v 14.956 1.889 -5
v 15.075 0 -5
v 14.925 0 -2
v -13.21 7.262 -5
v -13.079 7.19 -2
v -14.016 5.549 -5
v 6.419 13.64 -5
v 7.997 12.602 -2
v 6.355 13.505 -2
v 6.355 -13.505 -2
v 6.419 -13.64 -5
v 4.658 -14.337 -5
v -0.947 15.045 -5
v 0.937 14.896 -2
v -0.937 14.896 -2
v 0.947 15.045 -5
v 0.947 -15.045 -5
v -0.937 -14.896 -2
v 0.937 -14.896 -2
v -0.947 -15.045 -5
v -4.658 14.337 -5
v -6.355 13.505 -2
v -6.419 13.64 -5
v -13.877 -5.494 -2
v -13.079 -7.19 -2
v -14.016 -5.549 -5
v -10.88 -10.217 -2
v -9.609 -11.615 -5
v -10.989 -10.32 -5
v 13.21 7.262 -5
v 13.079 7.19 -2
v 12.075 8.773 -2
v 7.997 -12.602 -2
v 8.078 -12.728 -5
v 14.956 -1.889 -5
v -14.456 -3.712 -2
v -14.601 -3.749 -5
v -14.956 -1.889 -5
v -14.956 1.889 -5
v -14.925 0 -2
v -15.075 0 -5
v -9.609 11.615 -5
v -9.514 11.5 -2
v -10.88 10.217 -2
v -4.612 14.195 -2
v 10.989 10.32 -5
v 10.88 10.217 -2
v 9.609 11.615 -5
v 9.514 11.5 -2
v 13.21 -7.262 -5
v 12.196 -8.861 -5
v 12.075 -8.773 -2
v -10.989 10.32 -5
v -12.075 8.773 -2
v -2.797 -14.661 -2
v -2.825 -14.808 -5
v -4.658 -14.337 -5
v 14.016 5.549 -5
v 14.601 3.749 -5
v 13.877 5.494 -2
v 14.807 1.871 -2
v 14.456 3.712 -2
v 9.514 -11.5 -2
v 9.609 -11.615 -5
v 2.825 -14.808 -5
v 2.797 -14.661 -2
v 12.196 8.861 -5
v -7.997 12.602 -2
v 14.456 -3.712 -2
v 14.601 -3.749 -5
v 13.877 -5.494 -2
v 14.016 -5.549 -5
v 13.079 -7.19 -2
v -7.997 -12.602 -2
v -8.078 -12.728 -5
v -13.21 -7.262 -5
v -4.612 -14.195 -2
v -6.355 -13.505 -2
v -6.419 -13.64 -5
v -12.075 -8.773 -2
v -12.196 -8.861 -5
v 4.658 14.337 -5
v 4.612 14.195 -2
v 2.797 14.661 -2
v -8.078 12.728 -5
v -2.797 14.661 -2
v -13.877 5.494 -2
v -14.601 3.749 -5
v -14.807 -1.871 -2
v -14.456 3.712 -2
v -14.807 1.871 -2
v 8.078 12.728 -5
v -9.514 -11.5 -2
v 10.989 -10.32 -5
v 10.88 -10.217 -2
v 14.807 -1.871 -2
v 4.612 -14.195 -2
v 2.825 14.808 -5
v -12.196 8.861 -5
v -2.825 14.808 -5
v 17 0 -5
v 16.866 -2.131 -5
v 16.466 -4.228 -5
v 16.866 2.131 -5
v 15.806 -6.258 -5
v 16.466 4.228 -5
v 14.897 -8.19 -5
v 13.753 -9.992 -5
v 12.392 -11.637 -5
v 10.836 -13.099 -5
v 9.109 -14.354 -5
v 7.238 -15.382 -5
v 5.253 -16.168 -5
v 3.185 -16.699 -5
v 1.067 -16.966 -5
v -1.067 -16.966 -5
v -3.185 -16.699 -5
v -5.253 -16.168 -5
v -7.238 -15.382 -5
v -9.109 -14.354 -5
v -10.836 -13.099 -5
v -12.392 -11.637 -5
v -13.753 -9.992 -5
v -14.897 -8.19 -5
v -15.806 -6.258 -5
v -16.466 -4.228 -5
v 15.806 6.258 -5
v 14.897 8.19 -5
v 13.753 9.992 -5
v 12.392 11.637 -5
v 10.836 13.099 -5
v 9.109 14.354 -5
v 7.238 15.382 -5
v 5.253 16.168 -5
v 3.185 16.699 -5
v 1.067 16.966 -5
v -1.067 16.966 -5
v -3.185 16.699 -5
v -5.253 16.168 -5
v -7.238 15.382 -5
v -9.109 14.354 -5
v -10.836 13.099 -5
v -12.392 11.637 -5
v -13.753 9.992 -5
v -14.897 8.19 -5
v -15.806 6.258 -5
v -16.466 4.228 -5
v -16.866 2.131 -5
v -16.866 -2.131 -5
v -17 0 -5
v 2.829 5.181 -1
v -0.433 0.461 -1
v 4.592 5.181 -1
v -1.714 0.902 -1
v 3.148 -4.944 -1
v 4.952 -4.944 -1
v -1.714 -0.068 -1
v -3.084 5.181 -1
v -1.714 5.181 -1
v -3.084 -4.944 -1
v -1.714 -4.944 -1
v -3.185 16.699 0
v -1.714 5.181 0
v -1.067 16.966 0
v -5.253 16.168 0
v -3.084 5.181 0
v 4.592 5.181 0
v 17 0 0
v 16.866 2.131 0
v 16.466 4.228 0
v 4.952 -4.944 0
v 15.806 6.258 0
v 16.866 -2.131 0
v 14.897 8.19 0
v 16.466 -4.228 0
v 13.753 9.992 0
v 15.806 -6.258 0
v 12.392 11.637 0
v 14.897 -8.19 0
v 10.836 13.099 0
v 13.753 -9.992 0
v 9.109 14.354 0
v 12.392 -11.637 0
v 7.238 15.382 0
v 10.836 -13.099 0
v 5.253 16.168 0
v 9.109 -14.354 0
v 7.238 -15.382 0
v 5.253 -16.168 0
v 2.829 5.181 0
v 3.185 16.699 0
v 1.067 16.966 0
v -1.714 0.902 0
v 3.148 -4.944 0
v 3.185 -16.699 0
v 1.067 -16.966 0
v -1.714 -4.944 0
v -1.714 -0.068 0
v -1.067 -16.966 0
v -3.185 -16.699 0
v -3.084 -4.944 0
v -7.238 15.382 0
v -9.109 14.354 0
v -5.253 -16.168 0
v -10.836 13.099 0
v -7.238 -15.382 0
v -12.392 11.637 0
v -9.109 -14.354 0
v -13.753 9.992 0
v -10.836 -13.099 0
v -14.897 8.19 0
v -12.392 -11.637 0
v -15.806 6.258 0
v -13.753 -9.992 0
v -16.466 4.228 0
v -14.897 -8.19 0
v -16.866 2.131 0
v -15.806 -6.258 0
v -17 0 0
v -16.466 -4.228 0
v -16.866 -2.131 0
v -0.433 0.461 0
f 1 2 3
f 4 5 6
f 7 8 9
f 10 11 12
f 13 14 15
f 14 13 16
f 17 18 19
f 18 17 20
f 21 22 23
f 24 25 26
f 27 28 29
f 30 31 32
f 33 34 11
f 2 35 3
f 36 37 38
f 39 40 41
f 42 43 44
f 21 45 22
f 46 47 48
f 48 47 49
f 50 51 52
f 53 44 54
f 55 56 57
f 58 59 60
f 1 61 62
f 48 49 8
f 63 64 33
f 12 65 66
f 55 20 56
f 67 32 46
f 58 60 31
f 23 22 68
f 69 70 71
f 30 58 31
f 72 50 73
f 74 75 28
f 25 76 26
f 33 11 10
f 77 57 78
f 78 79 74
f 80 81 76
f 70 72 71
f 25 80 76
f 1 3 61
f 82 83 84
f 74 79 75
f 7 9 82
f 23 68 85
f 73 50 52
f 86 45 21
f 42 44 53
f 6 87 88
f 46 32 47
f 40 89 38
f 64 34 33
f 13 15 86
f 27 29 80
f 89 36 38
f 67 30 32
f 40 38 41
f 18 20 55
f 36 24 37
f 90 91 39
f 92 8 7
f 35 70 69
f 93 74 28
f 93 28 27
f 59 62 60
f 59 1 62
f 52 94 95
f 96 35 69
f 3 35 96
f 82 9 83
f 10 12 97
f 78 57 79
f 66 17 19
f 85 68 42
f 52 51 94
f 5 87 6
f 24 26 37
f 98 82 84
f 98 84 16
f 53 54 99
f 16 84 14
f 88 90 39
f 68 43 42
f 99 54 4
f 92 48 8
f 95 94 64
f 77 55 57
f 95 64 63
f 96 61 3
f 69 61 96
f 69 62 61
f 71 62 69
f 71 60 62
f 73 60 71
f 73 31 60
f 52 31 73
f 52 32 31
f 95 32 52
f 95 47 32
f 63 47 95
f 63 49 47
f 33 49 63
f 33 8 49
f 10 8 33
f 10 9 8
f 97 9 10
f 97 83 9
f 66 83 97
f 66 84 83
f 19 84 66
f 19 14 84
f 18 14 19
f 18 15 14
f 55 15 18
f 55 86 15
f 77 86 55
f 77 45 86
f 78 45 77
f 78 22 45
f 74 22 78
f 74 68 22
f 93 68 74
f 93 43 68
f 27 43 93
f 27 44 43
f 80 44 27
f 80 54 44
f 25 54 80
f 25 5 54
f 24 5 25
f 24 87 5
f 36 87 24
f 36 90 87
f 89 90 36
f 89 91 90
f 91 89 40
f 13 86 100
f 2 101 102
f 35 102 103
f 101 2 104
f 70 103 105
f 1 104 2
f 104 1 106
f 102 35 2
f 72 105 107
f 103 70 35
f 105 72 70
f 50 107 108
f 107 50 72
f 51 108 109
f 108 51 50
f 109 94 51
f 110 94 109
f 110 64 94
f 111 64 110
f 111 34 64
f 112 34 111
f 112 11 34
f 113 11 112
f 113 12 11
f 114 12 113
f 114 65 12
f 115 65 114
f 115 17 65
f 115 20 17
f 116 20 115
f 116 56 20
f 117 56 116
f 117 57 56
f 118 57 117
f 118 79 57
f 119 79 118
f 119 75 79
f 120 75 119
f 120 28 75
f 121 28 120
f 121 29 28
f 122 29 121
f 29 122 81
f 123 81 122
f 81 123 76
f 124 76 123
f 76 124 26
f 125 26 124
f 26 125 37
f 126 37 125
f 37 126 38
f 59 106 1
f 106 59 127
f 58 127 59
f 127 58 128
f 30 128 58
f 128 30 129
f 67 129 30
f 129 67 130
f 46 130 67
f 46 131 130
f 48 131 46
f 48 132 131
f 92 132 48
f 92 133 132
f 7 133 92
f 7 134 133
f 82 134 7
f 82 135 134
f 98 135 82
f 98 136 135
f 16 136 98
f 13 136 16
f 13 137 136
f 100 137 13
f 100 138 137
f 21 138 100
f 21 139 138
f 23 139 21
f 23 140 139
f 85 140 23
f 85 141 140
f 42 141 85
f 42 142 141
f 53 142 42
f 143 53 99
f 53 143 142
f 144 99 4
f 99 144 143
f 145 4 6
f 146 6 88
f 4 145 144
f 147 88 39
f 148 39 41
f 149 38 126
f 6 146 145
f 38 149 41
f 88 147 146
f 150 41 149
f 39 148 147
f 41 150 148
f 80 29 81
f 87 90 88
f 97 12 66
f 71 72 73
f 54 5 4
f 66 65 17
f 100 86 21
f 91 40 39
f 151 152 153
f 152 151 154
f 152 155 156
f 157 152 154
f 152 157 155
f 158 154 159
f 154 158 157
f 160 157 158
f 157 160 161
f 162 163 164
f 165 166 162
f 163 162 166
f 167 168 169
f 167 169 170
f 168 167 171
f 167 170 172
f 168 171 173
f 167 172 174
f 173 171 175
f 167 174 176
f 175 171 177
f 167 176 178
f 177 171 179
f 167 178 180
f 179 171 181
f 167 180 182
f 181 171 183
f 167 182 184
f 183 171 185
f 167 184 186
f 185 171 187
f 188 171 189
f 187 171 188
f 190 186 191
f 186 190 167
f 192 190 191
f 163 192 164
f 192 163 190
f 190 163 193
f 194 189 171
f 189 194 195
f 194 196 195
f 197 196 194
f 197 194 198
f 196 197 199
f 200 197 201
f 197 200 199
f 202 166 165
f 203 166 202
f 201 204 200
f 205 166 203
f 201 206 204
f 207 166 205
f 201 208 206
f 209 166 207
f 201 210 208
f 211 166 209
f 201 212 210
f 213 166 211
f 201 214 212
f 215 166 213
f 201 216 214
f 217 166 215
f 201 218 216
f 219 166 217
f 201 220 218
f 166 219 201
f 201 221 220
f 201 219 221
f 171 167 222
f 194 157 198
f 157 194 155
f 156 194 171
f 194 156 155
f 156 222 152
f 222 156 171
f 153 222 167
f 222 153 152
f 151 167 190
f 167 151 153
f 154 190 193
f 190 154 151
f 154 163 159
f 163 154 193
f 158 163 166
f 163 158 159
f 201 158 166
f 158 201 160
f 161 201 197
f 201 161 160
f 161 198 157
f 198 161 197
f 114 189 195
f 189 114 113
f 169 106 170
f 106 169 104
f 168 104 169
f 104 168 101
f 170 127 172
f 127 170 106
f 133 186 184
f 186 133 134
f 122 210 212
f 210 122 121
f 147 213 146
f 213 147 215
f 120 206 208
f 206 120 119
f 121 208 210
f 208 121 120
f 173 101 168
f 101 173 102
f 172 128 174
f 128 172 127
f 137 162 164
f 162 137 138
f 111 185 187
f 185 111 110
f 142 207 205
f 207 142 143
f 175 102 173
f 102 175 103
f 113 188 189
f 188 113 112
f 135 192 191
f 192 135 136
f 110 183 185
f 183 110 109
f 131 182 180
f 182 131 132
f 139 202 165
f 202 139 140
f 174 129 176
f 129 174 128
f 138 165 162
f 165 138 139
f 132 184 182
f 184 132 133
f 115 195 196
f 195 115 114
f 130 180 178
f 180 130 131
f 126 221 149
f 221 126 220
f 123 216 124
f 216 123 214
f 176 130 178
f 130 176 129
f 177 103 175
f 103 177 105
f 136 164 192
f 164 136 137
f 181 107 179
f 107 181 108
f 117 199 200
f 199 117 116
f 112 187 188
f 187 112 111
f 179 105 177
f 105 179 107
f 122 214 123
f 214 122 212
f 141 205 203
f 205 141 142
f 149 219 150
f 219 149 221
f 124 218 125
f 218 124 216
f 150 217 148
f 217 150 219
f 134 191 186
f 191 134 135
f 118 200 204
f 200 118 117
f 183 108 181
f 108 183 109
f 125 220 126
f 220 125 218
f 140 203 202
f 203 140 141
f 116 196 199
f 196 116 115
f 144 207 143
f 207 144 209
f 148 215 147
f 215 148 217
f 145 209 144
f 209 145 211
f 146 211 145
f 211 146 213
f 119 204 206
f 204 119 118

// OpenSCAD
$fn = 50;


difference() {
	union() {
		translate(v = [0, 0, -5.0000000000]) {
			cylinder(h = 5, r = 17.0000000000);
		}
	}
	union() {
		#translate(v = [0, 0, -5.0000000000]) {
			cylinder(h = 3, r1 = 15.0750000000, r2 = 14.9250000000);
		}
		translate(v = [0, 0, -1]) {
			linear_extrude(height = 1) {
				text(font = "Impact", halign = "center", size = 10, text = "K", valign = "center");
			}
		}
	}
}
